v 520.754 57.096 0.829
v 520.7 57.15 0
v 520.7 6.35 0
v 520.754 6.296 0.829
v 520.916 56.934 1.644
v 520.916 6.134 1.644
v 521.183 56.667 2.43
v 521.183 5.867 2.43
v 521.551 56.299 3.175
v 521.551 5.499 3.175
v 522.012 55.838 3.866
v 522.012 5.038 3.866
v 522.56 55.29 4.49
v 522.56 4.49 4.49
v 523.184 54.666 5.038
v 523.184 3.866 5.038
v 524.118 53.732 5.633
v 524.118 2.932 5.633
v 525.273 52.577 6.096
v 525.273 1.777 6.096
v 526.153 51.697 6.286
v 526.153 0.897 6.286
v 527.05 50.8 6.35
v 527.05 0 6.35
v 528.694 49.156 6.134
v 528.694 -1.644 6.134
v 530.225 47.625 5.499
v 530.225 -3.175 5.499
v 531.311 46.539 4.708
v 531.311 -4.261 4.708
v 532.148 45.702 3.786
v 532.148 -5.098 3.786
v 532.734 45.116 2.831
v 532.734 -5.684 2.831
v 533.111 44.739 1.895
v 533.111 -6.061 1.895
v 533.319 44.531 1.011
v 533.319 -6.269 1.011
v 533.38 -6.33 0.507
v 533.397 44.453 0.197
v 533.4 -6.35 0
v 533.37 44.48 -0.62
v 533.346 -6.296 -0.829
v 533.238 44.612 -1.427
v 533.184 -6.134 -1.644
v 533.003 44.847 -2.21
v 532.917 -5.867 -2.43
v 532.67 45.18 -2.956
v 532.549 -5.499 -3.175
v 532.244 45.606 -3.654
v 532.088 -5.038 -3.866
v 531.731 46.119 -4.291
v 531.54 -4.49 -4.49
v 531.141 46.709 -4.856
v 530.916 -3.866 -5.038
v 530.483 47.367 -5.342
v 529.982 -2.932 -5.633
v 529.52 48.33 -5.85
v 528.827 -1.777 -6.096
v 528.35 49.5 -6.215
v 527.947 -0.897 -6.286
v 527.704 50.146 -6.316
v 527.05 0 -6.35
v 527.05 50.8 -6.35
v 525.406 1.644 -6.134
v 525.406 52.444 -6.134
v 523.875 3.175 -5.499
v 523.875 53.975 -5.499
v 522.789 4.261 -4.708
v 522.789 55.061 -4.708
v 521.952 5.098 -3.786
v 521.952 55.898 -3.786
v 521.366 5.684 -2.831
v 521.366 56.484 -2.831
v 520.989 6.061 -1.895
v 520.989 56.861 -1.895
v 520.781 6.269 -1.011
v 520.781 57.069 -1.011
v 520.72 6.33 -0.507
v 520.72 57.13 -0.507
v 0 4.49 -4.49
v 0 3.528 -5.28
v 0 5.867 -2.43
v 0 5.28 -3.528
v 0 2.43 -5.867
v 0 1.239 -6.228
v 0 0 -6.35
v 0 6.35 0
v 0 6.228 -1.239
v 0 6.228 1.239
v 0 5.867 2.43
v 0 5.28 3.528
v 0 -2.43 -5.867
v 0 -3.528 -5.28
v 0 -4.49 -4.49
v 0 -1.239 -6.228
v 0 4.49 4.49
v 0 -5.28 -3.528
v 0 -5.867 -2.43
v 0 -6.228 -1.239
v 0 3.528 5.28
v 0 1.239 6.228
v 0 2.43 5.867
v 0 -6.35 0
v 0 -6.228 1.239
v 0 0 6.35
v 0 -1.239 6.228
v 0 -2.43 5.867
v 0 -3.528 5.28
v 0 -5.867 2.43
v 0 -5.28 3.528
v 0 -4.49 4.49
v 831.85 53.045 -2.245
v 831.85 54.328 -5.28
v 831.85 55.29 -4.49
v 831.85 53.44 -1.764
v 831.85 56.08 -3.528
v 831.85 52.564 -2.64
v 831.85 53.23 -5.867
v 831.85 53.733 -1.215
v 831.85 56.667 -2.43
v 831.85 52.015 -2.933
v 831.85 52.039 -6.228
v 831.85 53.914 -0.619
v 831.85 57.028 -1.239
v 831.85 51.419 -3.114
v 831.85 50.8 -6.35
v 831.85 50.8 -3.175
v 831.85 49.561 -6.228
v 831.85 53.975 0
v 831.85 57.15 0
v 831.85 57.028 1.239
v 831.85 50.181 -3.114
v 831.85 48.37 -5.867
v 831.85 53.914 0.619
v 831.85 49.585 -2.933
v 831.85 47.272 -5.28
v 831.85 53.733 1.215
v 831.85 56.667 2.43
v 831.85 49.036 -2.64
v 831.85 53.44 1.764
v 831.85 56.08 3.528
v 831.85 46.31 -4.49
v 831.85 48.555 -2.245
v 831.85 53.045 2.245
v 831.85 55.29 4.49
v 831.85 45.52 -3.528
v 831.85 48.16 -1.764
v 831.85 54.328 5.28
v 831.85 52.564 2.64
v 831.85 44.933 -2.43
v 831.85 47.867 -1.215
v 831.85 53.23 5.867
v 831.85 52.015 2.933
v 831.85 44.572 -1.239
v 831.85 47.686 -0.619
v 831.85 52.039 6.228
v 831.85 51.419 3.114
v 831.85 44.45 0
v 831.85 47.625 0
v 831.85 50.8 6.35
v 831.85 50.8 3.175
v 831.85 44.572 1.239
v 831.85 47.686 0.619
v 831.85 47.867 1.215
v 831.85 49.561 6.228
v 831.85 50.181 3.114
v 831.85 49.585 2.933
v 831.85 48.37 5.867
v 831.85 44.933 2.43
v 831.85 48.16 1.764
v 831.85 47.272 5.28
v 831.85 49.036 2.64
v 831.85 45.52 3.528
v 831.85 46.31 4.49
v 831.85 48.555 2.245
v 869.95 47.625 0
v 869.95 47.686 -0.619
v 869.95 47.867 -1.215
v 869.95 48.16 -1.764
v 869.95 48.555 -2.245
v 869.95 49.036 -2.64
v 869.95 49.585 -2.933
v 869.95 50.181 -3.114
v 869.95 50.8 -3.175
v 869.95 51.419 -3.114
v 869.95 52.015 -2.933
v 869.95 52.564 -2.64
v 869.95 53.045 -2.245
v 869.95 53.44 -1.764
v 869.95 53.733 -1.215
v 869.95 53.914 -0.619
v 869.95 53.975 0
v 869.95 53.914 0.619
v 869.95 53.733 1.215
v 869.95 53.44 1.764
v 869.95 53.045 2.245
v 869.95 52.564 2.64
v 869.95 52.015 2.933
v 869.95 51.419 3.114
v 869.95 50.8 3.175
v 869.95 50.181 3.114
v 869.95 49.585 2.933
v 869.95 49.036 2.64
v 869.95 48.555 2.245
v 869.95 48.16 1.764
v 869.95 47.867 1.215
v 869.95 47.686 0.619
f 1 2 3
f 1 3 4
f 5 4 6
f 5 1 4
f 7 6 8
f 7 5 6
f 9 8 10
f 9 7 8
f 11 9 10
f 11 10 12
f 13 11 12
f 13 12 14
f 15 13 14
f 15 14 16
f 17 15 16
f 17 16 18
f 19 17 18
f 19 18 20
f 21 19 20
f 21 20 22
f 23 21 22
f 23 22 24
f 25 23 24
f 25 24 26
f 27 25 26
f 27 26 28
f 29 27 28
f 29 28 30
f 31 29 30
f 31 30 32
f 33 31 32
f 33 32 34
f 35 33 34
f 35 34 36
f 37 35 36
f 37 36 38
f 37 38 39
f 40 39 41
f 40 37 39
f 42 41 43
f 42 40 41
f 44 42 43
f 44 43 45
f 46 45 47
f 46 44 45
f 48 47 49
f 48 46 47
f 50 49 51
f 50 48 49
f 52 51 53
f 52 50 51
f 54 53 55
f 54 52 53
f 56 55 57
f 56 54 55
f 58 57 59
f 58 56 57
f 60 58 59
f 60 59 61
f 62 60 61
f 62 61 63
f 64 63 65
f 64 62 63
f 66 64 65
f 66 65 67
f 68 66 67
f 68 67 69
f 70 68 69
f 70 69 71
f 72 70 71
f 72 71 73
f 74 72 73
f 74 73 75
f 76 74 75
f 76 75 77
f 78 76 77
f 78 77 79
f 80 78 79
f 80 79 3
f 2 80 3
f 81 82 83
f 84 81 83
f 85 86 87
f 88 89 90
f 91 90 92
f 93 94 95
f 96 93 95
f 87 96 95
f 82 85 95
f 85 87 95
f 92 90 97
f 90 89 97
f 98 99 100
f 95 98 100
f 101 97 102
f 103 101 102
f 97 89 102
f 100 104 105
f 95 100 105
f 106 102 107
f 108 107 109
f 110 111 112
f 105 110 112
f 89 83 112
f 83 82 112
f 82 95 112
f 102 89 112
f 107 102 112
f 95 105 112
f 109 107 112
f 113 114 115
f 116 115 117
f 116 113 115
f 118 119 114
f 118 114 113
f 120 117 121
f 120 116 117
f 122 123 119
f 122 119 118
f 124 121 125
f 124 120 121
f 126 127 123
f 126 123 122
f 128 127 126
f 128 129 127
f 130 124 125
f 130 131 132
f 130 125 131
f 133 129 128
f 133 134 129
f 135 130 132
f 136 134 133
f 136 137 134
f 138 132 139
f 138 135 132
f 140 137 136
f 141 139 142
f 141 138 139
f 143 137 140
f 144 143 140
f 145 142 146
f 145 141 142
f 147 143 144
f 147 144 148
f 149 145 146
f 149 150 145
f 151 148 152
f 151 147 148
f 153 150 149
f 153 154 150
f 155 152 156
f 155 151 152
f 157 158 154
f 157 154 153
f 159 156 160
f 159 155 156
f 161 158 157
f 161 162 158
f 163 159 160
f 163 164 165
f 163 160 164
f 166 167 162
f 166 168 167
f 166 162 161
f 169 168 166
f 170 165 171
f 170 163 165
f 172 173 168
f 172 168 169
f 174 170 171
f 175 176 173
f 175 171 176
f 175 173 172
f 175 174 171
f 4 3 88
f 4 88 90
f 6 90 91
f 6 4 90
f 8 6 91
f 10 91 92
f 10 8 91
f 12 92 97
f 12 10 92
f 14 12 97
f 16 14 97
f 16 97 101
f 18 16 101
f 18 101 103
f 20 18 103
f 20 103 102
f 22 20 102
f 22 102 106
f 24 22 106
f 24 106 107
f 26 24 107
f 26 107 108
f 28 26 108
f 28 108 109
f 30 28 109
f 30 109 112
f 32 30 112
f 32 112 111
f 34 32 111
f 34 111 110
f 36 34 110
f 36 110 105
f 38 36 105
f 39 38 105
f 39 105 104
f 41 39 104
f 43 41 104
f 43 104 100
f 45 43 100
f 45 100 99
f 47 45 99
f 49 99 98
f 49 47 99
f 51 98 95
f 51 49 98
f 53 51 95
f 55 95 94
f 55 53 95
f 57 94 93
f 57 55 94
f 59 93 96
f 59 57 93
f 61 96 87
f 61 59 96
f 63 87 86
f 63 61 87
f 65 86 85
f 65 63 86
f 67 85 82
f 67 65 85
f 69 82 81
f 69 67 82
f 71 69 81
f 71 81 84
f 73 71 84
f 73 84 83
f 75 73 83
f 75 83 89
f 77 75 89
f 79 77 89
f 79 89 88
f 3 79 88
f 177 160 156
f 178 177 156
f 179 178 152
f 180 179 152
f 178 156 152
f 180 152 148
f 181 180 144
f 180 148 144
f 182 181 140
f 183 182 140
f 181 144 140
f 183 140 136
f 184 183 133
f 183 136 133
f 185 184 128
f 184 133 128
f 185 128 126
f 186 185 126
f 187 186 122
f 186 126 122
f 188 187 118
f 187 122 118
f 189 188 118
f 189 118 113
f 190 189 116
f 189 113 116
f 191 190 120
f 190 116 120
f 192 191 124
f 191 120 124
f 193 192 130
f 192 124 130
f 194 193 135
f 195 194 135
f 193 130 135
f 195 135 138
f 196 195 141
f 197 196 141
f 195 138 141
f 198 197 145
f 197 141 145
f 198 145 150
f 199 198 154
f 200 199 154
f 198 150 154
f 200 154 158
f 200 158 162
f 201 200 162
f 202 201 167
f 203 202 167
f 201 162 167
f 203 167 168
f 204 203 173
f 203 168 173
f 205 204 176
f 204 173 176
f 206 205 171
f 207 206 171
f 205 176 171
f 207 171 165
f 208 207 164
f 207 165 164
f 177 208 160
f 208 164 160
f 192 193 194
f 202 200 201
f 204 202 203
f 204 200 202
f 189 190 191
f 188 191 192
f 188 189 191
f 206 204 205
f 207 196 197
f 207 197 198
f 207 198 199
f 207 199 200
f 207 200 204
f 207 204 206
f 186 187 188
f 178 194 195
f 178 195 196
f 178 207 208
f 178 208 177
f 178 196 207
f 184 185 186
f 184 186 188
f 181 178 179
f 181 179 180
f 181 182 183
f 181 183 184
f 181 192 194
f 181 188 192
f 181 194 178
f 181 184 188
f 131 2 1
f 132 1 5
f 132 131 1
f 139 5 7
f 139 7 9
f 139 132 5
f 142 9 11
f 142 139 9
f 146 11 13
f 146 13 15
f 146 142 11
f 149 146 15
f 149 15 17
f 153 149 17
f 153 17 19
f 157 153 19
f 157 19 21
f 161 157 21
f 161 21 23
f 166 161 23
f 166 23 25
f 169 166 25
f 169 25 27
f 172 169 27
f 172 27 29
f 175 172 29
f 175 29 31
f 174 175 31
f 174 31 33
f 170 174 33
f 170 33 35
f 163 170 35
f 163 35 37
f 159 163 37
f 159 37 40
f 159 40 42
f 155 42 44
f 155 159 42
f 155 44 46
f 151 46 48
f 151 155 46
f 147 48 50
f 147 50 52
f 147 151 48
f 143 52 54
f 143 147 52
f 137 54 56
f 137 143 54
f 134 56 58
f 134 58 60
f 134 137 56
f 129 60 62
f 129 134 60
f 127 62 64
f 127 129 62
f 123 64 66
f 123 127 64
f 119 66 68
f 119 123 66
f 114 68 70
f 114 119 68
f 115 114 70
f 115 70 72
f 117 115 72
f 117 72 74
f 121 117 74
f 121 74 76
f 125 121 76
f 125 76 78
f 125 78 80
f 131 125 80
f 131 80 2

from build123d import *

# Parameters (mm, degrees)
SWEEP1_PROFILE_R    = 6.35
SKETCH20_R          = 3.175
BOSS_EXTRUDE3_DEPTH = 38.1


with BuildPart() as part:
    # Sweep1: sweep along a path in Sketch1
    with BuildLine(Plane.XY) as sweep1_path:
        Line((0, 0), (527.05, 0))
        Line((527.05, 0), (527.05, 50.8))
        Line((527.05, 50.8), (831.85, 50.8))
    # Sweep1 profile (on start of the path) → Sweep1 (sweep)
    with BuildSketch(Plane.YZ):
        Circle(SWEEP1_PROFILE_R)
    sweep(path=sweep1_path.line, transition=Transition.RIGHT)

    # Sketch20 → Boss-Extrude3 (add)
    with BuildSketch(Plane(origin=(831.85, 0, 0), x_dir=(0, 0, -1), z_dir=(1, 0, 0))):
        with Locations(Location((0, 50.8, 0), (0, 0, 270))):
            Circle(SKETCH20_R)
    extrude(amount=BOSS_EXTRUDE3_DEPTH)


solid = part.part
